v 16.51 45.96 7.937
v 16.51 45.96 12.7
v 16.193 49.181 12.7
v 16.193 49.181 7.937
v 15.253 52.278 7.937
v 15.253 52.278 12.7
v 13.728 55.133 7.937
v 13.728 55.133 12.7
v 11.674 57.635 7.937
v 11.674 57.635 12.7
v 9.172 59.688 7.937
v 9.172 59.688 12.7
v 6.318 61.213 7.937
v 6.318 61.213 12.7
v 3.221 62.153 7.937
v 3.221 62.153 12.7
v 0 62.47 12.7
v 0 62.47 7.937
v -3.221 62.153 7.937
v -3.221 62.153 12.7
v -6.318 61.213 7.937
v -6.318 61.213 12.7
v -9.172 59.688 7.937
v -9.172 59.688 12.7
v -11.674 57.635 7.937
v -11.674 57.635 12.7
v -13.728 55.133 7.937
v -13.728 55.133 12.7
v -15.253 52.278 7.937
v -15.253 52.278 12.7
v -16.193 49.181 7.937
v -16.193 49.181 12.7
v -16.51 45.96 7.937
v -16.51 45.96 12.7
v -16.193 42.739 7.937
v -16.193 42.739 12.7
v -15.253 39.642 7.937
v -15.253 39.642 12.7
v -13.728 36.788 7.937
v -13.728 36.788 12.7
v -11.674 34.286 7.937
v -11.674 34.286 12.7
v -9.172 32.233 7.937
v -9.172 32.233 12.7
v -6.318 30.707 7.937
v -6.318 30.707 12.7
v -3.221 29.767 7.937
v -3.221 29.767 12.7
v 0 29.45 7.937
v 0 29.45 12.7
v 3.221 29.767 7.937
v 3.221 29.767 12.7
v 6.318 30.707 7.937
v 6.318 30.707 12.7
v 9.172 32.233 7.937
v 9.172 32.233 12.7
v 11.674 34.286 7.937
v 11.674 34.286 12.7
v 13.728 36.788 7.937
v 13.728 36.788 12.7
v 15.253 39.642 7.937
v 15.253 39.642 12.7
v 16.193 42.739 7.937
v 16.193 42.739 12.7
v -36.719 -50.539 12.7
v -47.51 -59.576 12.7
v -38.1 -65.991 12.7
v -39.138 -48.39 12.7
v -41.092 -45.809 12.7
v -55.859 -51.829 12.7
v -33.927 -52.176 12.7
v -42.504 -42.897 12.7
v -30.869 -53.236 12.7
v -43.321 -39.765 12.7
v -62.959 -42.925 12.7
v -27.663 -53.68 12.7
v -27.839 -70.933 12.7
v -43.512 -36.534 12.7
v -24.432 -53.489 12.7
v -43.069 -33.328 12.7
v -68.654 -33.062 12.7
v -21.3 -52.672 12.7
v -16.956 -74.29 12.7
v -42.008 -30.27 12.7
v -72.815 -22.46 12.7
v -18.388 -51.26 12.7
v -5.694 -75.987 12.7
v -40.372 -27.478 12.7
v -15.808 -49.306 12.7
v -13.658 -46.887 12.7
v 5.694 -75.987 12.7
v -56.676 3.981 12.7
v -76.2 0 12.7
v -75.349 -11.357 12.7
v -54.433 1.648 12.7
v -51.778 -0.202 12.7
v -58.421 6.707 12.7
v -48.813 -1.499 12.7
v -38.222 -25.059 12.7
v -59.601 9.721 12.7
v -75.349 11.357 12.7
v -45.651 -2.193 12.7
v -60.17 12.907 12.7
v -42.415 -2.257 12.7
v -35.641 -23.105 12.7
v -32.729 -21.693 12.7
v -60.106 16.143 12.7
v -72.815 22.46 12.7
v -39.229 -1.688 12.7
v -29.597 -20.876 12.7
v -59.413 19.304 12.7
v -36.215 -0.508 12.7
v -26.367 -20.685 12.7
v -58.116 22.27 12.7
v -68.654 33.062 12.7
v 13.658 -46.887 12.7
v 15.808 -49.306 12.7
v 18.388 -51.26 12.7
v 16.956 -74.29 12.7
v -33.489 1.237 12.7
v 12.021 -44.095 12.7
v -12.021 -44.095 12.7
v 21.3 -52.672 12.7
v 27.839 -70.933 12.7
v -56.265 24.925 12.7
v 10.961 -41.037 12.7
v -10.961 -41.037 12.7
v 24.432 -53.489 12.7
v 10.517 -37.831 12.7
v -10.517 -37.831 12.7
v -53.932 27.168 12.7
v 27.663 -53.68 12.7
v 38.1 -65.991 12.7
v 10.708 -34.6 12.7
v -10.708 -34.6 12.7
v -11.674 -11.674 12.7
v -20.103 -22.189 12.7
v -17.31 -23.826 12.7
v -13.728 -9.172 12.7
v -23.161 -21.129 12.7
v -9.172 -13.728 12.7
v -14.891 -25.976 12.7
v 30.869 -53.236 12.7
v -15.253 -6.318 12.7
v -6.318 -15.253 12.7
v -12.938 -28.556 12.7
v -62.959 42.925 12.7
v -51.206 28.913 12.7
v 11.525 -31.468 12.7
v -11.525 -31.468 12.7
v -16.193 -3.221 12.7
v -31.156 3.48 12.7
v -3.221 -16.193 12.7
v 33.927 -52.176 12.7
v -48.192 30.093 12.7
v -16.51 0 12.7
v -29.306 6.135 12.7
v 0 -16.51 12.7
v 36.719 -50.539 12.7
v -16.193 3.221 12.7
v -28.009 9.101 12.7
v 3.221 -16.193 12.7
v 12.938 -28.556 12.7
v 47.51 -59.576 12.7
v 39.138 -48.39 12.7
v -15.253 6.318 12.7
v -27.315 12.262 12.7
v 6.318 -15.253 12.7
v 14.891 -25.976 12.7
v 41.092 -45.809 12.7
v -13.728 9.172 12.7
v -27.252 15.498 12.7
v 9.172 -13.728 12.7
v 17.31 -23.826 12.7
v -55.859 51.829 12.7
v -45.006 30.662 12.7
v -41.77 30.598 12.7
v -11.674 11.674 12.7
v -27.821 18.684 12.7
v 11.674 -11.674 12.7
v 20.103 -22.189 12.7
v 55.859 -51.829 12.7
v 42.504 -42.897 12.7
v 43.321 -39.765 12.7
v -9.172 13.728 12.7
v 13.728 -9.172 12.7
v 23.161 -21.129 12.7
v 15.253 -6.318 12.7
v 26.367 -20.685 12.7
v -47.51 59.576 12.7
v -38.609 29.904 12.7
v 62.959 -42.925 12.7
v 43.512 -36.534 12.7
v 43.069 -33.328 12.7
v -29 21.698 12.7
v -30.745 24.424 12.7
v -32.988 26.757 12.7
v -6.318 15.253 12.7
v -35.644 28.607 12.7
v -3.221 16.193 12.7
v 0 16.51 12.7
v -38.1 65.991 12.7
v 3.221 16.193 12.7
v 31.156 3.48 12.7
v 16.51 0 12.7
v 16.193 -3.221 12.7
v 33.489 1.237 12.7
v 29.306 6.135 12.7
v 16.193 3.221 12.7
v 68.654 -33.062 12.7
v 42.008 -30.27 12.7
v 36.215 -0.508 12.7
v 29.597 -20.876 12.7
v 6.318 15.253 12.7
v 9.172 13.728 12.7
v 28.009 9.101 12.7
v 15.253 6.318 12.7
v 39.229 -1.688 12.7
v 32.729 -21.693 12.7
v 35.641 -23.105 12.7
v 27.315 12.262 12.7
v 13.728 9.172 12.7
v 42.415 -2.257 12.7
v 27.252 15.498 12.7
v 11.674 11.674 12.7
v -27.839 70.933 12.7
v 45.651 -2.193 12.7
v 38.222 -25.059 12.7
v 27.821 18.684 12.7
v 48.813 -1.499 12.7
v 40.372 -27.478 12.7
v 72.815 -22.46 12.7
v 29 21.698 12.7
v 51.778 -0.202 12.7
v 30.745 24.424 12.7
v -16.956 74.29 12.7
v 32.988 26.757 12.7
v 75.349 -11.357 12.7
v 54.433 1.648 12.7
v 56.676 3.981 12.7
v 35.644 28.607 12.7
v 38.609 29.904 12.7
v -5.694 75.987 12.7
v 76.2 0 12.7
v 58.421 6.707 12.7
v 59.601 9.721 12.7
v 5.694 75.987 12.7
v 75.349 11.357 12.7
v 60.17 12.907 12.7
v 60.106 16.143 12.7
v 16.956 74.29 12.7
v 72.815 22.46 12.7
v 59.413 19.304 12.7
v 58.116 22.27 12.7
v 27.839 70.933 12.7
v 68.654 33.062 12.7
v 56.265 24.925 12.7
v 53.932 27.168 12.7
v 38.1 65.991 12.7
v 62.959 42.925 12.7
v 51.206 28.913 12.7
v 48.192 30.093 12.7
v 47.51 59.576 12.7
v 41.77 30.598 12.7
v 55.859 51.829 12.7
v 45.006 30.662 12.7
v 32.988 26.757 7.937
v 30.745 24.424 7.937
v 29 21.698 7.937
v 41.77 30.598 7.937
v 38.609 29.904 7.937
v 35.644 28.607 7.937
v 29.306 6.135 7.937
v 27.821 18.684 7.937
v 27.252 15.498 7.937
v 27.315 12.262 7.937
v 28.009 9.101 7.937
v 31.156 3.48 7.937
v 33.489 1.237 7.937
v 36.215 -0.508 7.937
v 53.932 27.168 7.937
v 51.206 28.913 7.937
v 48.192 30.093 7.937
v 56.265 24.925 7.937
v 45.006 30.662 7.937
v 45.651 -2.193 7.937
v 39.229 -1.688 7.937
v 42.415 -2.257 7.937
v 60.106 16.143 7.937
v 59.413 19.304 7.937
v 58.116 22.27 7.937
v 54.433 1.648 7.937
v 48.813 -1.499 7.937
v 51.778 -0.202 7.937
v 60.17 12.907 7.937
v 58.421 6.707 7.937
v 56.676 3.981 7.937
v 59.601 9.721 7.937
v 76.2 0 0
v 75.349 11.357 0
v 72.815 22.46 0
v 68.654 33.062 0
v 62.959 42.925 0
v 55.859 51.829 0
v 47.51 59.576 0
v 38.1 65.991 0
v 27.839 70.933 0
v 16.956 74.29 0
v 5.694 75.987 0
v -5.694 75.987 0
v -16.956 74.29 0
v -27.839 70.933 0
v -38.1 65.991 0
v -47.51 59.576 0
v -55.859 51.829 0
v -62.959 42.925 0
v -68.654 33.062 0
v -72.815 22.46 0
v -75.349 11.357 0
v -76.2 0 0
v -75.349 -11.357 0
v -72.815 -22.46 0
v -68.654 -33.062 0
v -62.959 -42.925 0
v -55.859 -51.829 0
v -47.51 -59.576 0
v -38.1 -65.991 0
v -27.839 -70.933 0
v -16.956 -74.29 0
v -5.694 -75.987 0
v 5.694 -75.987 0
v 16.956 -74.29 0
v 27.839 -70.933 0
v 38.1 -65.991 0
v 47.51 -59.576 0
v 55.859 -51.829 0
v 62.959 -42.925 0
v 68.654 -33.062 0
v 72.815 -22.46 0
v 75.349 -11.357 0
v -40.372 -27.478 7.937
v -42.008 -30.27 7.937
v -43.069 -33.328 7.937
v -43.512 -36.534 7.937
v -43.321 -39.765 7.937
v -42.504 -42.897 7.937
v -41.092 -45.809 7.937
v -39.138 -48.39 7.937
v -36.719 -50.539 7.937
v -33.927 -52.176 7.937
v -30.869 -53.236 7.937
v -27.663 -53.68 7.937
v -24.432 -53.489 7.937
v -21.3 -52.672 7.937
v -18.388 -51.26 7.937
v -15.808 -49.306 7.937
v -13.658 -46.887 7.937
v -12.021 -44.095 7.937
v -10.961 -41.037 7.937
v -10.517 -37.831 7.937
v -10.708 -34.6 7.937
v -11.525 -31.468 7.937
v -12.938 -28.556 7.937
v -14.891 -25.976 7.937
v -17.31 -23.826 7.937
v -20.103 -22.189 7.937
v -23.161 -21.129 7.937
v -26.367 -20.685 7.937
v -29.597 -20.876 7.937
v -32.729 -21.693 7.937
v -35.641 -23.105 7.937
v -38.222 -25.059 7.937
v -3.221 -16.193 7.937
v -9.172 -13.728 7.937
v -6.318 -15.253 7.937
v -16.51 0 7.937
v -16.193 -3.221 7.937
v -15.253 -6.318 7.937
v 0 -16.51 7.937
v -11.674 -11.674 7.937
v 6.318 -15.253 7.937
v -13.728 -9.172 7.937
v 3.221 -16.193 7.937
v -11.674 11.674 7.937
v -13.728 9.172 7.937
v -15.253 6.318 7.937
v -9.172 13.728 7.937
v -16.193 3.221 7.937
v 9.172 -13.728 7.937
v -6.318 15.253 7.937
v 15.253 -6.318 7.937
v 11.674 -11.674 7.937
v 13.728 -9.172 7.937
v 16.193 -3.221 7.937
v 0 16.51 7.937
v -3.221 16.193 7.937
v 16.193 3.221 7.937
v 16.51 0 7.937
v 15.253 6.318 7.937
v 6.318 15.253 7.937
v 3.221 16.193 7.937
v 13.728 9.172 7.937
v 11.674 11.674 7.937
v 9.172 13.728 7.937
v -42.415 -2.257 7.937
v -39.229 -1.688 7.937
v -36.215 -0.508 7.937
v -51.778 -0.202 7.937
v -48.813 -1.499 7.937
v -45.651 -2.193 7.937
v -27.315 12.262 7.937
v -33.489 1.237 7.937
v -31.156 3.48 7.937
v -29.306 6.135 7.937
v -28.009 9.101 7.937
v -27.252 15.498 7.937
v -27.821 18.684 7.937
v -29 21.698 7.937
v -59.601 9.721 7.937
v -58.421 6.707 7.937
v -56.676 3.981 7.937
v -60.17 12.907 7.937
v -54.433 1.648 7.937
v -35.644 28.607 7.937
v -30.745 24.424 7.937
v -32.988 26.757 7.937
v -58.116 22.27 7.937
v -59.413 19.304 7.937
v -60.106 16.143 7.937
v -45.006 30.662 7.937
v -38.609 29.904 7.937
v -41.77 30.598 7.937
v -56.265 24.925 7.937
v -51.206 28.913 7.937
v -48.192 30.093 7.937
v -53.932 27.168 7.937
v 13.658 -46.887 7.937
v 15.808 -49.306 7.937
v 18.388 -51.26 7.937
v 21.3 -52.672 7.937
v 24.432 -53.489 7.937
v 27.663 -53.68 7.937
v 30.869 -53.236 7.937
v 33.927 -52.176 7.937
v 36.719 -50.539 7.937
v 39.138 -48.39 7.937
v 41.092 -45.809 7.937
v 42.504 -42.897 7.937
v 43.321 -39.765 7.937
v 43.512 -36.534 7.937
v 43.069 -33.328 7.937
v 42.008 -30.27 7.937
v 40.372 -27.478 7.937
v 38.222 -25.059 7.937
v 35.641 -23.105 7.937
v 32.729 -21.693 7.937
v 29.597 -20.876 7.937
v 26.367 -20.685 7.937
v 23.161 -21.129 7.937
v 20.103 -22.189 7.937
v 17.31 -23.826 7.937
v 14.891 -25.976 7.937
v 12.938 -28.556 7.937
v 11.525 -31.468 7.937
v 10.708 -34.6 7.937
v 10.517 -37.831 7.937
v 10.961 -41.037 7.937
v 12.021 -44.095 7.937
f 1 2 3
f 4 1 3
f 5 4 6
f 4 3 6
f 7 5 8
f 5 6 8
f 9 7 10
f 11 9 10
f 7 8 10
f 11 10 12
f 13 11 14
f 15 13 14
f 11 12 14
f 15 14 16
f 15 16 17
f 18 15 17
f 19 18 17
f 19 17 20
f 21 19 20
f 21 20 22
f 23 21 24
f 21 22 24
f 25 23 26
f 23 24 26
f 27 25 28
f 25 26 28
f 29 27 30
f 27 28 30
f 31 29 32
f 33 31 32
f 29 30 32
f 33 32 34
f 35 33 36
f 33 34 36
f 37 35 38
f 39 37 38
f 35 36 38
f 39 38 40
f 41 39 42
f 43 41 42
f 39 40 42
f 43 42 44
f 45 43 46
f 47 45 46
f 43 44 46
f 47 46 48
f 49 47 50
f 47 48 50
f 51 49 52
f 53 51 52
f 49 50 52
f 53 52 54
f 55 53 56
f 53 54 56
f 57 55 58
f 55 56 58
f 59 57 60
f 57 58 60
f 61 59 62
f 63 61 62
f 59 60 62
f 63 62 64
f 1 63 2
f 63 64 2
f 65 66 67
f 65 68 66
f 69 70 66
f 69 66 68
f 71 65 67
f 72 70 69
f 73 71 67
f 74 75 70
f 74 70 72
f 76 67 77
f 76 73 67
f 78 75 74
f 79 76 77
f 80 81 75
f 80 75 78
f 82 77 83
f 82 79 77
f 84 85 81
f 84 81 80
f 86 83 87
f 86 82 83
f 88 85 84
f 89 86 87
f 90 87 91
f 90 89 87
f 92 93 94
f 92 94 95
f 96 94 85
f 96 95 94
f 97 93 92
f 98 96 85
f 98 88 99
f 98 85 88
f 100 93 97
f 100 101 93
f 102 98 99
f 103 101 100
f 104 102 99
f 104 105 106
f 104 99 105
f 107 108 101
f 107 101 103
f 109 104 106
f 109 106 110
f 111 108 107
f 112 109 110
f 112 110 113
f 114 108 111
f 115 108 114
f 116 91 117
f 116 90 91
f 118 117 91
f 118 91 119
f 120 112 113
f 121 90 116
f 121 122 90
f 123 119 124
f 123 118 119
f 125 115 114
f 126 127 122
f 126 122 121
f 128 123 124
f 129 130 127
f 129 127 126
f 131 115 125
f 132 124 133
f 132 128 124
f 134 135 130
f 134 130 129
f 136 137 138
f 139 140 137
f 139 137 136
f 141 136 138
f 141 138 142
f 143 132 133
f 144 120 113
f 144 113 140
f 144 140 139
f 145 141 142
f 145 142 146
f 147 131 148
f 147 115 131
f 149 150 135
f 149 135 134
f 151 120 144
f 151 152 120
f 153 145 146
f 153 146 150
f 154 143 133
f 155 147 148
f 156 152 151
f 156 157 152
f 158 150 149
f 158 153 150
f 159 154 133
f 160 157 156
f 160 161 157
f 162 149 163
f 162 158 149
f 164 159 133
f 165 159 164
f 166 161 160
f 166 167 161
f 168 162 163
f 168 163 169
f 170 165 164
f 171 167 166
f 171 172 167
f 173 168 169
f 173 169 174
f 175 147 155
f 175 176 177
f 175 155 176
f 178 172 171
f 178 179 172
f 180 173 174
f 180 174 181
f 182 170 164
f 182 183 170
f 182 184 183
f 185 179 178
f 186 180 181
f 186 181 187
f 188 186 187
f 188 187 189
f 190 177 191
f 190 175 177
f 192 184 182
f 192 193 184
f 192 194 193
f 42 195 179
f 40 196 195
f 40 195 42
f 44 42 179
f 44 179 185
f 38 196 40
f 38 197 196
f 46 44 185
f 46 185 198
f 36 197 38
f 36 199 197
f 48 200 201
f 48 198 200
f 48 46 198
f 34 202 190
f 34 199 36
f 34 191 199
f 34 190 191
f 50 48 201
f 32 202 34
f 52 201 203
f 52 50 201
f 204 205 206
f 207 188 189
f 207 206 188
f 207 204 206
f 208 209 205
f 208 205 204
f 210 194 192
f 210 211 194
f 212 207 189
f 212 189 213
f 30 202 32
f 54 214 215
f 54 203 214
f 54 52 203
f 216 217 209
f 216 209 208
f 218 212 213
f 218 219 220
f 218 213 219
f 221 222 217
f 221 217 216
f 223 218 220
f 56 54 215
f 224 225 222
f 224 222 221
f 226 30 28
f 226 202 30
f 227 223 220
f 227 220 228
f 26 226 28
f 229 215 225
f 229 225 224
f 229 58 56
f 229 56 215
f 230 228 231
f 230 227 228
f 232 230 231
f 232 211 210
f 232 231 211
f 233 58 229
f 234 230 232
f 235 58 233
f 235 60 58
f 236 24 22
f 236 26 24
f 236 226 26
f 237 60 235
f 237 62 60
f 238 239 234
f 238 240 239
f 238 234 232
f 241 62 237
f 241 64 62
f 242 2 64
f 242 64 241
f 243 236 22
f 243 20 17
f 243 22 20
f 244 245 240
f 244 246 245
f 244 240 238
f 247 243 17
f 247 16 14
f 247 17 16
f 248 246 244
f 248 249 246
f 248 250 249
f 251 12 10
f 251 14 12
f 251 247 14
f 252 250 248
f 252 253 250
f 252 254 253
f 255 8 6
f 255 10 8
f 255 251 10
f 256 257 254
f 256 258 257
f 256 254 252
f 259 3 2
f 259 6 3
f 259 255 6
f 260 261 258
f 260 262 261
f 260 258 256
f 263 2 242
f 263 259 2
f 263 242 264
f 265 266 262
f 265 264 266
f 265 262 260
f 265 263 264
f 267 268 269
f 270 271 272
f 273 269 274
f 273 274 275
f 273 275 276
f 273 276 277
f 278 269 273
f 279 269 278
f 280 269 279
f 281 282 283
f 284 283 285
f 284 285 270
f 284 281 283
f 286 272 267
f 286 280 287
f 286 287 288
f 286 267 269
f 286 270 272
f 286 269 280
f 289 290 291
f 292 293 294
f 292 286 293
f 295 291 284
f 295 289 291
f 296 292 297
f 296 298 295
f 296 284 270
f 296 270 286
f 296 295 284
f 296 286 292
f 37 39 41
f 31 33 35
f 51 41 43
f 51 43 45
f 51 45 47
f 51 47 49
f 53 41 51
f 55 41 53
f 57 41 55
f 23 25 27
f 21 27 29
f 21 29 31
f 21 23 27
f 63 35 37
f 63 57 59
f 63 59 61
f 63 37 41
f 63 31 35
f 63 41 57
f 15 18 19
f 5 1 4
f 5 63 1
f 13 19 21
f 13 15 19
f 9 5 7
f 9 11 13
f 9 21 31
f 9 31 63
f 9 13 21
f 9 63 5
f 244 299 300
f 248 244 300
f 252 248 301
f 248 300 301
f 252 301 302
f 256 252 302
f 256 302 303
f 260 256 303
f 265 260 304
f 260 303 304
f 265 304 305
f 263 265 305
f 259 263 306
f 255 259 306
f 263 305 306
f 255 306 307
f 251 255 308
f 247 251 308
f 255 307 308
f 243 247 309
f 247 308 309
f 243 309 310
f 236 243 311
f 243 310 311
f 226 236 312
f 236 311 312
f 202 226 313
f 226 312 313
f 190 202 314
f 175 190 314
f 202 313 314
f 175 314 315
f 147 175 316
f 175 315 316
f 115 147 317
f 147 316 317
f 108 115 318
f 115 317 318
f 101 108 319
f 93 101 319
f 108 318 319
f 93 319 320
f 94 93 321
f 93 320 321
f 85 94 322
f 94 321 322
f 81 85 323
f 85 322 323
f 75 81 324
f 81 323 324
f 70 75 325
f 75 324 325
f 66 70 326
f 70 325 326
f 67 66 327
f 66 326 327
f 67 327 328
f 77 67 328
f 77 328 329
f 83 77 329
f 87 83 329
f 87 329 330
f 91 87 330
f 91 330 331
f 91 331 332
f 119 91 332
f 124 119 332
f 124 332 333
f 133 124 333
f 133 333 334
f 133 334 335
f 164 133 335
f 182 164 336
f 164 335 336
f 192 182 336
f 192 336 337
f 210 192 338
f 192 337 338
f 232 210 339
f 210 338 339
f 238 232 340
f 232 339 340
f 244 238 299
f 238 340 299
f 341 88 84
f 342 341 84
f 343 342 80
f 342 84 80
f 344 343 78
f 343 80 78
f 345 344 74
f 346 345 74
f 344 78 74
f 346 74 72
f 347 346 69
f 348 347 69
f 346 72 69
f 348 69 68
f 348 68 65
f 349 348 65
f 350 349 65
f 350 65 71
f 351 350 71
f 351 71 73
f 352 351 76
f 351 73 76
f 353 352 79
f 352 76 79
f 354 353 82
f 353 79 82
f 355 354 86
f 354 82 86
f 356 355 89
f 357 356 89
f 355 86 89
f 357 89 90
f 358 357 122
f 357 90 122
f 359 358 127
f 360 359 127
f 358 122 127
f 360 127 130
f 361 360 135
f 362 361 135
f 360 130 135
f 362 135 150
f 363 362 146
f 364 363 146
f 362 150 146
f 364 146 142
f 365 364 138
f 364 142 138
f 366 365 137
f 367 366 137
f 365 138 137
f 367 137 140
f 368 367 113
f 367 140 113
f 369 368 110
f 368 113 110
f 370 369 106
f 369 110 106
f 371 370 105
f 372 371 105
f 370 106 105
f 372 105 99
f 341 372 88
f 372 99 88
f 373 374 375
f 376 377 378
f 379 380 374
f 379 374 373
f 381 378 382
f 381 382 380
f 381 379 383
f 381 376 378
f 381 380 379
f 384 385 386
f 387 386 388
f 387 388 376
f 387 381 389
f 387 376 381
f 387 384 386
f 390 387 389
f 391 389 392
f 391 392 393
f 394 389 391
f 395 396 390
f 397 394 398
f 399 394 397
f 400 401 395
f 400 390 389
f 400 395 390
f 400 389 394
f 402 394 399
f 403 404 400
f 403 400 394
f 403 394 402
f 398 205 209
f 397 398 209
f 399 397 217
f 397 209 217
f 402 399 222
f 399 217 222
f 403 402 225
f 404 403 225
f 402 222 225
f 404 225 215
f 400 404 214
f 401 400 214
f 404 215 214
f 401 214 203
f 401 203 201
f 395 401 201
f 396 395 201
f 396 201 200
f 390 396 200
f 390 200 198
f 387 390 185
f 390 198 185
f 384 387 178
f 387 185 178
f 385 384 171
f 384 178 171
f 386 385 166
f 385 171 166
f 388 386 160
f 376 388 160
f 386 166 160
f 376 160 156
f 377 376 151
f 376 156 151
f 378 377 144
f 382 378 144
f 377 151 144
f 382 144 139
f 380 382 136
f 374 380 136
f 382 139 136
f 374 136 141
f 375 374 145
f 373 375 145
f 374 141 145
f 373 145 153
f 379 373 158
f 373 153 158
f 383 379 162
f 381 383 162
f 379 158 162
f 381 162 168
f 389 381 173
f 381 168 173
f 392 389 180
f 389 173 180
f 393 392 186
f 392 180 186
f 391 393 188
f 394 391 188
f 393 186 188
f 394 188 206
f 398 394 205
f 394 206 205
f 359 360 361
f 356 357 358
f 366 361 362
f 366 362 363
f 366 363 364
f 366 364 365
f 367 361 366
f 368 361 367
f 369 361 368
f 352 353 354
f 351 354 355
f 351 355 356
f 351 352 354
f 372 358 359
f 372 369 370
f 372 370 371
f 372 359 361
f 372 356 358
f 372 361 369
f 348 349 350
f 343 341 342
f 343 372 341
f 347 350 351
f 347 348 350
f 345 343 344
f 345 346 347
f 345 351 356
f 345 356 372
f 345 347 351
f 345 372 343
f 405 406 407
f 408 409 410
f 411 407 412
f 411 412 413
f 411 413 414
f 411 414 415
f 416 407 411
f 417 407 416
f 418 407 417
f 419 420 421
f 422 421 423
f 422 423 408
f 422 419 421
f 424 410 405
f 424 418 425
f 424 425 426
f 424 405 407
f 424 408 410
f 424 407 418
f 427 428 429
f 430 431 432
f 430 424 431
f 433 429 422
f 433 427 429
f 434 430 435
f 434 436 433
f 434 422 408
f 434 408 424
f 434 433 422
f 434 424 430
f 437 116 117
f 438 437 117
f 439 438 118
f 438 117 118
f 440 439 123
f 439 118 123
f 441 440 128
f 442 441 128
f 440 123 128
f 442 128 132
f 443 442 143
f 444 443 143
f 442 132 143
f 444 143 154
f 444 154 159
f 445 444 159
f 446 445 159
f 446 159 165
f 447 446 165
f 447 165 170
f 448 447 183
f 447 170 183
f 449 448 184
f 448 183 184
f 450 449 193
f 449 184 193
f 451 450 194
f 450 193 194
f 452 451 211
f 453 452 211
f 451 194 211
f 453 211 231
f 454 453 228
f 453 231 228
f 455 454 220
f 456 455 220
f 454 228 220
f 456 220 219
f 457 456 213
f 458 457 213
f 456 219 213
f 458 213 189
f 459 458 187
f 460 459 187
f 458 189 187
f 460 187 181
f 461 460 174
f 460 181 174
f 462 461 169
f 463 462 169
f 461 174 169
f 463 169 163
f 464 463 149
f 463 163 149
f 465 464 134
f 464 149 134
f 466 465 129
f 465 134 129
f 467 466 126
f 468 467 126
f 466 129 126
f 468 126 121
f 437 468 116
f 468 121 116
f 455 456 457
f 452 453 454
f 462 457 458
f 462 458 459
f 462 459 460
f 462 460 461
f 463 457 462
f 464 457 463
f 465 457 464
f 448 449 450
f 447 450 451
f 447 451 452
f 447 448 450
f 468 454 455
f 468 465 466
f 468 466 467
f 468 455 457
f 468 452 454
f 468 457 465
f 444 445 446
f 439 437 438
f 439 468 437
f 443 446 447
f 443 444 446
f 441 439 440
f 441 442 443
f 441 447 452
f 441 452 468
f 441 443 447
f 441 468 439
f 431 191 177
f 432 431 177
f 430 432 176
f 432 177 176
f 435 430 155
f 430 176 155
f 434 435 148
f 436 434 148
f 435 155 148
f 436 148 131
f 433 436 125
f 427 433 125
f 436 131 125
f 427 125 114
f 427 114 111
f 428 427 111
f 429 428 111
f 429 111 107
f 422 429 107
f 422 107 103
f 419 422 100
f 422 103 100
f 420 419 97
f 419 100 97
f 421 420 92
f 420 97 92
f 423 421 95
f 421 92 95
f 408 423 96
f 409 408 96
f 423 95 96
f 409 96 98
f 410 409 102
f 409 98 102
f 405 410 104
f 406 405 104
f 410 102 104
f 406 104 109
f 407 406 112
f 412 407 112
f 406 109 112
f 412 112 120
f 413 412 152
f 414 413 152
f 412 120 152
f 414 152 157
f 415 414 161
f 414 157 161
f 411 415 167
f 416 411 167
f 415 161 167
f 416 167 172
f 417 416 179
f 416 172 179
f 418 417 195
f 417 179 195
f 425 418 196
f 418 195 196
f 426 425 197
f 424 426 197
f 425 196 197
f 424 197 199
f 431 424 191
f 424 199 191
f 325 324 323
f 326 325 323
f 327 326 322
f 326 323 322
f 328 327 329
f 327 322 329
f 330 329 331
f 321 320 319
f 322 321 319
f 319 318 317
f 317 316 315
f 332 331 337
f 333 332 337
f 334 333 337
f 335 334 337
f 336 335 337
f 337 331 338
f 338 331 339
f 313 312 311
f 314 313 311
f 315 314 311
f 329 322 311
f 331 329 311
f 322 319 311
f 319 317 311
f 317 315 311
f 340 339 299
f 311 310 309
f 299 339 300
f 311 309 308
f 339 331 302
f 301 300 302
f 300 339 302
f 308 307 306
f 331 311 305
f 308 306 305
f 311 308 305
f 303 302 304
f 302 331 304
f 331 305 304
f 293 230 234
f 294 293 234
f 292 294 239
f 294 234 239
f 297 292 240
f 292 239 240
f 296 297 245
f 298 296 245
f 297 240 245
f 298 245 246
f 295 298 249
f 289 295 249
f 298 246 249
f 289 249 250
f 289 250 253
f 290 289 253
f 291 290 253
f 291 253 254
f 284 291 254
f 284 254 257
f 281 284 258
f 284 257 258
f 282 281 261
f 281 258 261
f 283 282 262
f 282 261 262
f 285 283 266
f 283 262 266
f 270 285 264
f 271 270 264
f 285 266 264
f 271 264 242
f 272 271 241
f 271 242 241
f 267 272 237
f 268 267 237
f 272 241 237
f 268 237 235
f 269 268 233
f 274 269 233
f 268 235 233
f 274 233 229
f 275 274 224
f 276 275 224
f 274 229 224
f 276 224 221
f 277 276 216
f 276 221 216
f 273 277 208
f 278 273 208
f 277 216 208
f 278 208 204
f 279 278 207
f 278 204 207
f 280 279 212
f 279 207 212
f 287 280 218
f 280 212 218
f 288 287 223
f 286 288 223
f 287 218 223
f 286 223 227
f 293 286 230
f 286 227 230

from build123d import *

# Parameters (mm, degrees)
F0_R            = 76.2
F1_DEPTH        = 12.7
F2_R            = 16.51
F3_DEPTH        = 4.7625
F3_COPIES_COUNT = 5
F4_R            = 16.51
F5_DEPTH        = 4.7625


# Not quite as in the source:
# - a pattern or mirror of a feature is missing from the dataset's text; its kind, count and spacing are read off the source's solid


with BuildPart() as f1:
    # F0 (on Top) → F1 (new body)
    with BuildSketch(Plane.XY):
        Circle(F0_R)
    extrude(amount=F1_DEPTH)

    # F2 (on face) → F3 (cut)
    with BuildSketch(Plane.XY.offset(12.7)):
        with Locations((0, 45.9601860202)):
            Circle(F2_R)
    f3 = extrude(amount=-F3_DEPTH, mode=Mode.SUBTRACT)

    # F3_copies: F3 ×5 about axis
    f3_copies_axis = Axis((0, 0, 0), (0, 0, 1))
    for i in range(1, F3_COPIES_COUNT):
        add(f3.rotate(f3_copies_axis, i * 360 / F3_COPIES_COUNT), mode=Mode.SUBTRACT)

    # F4 (on face) → F5 (cut)
    with BuildSketch(Plane.XY.offset(12.7)):
        Circle(F4_R)
    extrude(amount=-F5_DEPTH, mode=Mode.SUBTRACT)


solid = f1.part
